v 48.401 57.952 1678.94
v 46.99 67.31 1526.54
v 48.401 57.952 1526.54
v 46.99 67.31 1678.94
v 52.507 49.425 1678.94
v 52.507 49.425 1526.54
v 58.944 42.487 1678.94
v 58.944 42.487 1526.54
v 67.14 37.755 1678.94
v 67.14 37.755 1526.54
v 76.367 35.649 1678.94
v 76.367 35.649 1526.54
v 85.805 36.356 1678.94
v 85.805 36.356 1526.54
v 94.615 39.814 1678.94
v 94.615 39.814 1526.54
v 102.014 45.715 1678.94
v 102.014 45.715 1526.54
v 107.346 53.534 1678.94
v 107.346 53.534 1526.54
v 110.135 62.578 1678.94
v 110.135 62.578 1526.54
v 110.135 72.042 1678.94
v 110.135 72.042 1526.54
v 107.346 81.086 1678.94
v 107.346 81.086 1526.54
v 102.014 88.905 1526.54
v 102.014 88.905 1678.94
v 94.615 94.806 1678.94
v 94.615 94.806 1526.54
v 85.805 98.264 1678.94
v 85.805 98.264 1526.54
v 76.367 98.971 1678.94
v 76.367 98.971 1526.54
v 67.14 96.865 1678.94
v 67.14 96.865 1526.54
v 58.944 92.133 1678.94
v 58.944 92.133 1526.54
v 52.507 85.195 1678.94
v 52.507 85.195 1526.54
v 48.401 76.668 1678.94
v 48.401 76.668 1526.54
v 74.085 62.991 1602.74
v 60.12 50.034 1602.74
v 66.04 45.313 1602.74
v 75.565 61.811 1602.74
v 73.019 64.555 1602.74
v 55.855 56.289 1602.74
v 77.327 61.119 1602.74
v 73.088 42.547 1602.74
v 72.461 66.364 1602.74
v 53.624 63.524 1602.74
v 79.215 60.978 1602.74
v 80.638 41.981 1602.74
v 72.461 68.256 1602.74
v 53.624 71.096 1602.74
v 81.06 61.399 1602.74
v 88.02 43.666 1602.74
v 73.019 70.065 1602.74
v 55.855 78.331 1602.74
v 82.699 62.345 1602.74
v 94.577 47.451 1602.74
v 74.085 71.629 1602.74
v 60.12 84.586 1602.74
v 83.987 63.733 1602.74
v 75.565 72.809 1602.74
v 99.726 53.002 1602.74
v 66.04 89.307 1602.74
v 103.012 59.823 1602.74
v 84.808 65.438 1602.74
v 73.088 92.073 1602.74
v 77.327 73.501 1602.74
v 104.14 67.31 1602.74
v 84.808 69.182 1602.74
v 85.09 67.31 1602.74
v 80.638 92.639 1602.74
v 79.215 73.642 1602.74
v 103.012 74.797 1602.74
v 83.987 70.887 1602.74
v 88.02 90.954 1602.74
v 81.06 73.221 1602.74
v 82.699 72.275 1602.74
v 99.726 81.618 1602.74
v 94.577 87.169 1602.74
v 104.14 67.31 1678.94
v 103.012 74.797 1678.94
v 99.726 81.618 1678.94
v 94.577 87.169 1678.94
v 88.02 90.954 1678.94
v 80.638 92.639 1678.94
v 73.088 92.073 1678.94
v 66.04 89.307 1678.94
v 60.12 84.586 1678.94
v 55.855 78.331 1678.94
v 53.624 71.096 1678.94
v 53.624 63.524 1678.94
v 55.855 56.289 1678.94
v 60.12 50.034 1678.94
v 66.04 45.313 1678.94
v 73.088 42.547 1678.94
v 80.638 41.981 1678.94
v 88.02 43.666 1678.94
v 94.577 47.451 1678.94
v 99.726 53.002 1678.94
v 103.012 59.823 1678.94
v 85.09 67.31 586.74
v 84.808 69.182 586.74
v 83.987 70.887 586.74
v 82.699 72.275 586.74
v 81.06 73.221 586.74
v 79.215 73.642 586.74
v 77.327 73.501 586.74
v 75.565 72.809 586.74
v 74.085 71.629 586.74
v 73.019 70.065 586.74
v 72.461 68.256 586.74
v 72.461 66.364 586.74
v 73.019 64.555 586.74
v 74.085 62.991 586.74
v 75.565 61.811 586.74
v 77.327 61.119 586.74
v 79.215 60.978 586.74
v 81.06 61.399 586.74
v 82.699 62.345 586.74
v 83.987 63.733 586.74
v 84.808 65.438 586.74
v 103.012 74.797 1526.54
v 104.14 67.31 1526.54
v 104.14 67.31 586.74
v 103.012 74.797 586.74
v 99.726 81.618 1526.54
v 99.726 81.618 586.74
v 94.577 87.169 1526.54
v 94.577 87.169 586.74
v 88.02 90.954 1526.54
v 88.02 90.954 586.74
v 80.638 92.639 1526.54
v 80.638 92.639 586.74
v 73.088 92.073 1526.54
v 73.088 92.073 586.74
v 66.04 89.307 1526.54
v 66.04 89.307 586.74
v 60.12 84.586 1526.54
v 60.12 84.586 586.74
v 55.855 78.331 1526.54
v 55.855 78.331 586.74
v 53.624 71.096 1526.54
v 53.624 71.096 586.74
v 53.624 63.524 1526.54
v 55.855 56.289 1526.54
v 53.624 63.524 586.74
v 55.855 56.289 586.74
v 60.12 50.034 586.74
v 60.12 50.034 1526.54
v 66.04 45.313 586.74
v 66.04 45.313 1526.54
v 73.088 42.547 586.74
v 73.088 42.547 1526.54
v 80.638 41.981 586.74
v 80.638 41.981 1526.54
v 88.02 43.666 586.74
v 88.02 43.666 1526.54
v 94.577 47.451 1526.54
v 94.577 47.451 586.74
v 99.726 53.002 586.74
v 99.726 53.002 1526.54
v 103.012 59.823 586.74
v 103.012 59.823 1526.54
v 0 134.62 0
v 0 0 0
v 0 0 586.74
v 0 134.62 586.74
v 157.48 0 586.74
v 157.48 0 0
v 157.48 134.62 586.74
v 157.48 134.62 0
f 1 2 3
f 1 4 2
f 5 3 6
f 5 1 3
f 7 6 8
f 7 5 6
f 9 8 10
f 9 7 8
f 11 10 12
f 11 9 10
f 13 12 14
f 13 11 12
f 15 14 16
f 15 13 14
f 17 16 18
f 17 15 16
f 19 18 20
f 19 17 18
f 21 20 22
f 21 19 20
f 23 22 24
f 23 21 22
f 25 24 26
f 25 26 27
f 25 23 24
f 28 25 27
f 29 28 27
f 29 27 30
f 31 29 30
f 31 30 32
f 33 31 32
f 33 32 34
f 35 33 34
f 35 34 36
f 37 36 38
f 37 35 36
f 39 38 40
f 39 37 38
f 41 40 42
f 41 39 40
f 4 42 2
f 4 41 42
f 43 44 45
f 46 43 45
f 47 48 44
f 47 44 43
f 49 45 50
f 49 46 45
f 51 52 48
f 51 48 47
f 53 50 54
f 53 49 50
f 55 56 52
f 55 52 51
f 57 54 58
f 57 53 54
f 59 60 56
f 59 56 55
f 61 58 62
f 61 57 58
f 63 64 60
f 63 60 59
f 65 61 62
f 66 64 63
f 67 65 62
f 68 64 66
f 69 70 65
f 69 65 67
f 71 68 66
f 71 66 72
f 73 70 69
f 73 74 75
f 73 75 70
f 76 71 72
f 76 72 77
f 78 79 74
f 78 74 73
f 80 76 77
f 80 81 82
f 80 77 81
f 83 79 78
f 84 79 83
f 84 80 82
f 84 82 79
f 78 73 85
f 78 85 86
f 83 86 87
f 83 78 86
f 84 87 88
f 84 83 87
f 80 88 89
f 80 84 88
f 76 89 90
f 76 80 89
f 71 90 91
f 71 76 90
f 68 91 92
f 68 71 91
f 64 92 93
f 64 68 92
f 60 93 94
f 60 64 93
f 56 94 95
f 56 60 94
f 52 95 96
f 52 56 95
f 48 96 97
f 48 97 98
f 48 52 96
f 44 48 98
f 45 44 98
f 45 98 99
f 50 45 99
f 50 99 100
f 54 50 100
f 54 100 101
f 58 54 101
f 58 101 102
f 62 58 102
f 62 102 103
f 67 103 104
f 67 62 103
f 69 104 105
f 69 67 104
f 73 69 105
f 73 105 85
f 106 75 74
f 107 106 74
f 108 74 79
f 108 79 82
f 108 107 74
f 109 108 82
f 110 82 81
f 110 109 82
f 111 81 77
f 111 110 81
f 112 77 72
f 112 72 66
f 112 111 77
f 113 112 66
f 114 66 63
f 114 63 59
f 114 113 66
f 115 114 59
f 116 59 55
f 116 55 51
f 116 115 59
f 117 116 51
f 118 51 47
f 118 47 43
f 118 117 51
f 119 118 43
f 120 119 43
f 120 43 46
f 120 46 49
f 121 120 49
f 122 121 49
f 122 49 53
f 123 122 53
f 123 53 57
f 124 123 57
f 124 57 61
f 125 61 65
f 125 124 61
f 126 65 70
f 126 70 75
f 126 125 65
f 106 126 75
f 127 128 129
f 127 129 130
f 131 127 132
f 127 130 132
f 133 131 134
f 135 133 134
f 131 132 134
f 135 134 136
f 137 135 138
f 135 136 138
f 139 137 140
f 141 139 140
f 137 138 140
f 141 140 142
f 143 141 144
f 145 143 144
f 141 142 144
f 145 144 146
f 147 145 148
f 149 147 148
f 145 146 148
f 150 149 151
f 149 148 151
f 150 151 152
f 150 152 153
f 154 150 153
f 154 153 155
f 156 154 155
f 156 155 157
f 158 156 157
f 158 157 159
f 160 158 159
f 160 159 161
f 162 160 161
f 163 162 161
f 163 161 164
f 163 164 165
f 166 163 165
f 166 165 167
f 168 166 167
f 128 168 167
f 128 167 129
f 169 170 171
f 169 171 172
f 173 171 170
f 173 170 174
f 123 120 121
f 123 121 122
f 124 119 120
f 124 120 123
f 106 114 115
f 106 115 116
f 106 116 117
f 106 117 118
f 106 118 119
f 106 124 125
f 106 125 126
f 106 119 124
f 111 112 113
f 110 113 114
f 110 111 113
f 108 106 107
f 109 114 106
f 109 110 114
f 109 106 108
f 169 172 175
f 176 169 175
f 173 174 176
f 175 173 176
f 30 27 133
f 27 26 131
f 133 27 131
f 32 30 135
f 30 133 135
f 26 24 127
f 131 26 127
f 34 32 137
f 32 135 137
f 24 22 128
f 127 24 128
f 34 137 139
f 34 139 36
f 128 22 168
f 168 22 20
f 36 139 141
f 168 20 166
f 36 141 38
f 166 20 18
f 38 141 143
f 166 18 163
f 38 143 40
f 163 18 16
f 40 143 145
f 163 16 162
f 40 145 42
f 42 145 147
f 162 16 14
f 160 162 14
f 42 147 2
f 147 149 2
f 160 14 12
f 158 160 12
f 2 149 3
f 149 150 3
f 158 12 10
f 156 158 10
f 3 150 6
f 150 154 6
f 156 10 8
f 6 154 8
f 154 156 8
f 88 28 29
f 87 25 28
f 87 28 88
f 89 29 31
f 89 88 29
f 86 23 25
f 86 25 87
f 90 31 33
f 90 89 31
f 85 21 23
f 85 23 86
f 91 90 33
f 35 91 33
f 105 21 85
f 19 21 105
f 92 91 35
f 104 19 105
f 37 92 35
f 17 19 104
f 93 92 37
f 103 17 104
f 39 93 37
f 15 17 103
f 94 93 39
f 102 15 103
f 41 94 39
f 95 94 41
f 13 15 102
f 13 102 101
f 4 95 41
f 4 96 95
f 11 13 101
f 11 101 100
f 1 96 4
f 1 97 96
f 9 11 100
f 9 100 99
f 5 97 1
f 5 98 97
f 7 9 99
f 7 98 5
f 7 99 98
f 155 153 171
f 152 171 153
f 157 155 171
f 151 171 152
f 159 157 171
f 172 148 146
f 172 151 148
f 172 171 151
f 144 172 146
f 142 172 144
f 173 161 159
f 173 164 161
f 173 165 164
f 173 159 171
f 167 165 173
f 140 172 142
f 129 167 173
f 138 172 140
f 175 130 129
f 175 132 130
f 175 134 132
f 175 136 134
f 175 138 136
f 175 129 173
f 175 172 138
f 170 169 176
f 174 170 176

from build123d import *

# Parameters (mm, degrees)
SKETCH1_W           = 157.48
SKETCH1_H           = 134.62
BOSS_EXTRUDE1_DEPTH = 586.74
SKETCH2_R           = 25.4
SKETCH2_R_2         = 6.35
BOSS_EXTRUDE2_DEPTH = 1016
SKETCH3_R           = 31.75
SKETCH3_R_2         = 25.4
BOSS_EXTRUDE3_DEPTH = 76.2


with BuildPart() as part:
    # Sketch1 → Boss-Extrude1 (new body)
    with BuildSketch(Plane.XY):
        with Locations((78.74, 67.31)):
            Rectangle(SKETCH1_W, SKETCH1_H)
    extrude(amount=BOSS_EXTRUDE1_DEPTH)

    # Sketch2 → Boss-Extrude2 (add)
    with BuildSketch(Plane.XY.offset(586.74)):
        with Locations((78.74, 67.31)):
            Circle(SKETCH2_R)
        with Locations((78.74, 67.31)):
            Circle(SKETCH2_R_2, mode=Mode.SUBTRACT)
    extrude(amount=BOSS_EXTRUDE2_DEPTH)

    # Sketch3 → Boss-Extrude3 (add, symmetric)
    with BuildSketch(Plane.XY.offset(1602.74)):
        with Locations(Location((78.74, 67.31, 0), (0, 0, 180))):
            Circle(SKETCH3_R)
        with Locations((78.74, 67.31)):
            Circle(SKETCH3_R_2, mode=Mode.SUBTRACT)
    extrude(amount=BOSS_EXTRUDE3_DEPTH, both=True)


solid = part.part
